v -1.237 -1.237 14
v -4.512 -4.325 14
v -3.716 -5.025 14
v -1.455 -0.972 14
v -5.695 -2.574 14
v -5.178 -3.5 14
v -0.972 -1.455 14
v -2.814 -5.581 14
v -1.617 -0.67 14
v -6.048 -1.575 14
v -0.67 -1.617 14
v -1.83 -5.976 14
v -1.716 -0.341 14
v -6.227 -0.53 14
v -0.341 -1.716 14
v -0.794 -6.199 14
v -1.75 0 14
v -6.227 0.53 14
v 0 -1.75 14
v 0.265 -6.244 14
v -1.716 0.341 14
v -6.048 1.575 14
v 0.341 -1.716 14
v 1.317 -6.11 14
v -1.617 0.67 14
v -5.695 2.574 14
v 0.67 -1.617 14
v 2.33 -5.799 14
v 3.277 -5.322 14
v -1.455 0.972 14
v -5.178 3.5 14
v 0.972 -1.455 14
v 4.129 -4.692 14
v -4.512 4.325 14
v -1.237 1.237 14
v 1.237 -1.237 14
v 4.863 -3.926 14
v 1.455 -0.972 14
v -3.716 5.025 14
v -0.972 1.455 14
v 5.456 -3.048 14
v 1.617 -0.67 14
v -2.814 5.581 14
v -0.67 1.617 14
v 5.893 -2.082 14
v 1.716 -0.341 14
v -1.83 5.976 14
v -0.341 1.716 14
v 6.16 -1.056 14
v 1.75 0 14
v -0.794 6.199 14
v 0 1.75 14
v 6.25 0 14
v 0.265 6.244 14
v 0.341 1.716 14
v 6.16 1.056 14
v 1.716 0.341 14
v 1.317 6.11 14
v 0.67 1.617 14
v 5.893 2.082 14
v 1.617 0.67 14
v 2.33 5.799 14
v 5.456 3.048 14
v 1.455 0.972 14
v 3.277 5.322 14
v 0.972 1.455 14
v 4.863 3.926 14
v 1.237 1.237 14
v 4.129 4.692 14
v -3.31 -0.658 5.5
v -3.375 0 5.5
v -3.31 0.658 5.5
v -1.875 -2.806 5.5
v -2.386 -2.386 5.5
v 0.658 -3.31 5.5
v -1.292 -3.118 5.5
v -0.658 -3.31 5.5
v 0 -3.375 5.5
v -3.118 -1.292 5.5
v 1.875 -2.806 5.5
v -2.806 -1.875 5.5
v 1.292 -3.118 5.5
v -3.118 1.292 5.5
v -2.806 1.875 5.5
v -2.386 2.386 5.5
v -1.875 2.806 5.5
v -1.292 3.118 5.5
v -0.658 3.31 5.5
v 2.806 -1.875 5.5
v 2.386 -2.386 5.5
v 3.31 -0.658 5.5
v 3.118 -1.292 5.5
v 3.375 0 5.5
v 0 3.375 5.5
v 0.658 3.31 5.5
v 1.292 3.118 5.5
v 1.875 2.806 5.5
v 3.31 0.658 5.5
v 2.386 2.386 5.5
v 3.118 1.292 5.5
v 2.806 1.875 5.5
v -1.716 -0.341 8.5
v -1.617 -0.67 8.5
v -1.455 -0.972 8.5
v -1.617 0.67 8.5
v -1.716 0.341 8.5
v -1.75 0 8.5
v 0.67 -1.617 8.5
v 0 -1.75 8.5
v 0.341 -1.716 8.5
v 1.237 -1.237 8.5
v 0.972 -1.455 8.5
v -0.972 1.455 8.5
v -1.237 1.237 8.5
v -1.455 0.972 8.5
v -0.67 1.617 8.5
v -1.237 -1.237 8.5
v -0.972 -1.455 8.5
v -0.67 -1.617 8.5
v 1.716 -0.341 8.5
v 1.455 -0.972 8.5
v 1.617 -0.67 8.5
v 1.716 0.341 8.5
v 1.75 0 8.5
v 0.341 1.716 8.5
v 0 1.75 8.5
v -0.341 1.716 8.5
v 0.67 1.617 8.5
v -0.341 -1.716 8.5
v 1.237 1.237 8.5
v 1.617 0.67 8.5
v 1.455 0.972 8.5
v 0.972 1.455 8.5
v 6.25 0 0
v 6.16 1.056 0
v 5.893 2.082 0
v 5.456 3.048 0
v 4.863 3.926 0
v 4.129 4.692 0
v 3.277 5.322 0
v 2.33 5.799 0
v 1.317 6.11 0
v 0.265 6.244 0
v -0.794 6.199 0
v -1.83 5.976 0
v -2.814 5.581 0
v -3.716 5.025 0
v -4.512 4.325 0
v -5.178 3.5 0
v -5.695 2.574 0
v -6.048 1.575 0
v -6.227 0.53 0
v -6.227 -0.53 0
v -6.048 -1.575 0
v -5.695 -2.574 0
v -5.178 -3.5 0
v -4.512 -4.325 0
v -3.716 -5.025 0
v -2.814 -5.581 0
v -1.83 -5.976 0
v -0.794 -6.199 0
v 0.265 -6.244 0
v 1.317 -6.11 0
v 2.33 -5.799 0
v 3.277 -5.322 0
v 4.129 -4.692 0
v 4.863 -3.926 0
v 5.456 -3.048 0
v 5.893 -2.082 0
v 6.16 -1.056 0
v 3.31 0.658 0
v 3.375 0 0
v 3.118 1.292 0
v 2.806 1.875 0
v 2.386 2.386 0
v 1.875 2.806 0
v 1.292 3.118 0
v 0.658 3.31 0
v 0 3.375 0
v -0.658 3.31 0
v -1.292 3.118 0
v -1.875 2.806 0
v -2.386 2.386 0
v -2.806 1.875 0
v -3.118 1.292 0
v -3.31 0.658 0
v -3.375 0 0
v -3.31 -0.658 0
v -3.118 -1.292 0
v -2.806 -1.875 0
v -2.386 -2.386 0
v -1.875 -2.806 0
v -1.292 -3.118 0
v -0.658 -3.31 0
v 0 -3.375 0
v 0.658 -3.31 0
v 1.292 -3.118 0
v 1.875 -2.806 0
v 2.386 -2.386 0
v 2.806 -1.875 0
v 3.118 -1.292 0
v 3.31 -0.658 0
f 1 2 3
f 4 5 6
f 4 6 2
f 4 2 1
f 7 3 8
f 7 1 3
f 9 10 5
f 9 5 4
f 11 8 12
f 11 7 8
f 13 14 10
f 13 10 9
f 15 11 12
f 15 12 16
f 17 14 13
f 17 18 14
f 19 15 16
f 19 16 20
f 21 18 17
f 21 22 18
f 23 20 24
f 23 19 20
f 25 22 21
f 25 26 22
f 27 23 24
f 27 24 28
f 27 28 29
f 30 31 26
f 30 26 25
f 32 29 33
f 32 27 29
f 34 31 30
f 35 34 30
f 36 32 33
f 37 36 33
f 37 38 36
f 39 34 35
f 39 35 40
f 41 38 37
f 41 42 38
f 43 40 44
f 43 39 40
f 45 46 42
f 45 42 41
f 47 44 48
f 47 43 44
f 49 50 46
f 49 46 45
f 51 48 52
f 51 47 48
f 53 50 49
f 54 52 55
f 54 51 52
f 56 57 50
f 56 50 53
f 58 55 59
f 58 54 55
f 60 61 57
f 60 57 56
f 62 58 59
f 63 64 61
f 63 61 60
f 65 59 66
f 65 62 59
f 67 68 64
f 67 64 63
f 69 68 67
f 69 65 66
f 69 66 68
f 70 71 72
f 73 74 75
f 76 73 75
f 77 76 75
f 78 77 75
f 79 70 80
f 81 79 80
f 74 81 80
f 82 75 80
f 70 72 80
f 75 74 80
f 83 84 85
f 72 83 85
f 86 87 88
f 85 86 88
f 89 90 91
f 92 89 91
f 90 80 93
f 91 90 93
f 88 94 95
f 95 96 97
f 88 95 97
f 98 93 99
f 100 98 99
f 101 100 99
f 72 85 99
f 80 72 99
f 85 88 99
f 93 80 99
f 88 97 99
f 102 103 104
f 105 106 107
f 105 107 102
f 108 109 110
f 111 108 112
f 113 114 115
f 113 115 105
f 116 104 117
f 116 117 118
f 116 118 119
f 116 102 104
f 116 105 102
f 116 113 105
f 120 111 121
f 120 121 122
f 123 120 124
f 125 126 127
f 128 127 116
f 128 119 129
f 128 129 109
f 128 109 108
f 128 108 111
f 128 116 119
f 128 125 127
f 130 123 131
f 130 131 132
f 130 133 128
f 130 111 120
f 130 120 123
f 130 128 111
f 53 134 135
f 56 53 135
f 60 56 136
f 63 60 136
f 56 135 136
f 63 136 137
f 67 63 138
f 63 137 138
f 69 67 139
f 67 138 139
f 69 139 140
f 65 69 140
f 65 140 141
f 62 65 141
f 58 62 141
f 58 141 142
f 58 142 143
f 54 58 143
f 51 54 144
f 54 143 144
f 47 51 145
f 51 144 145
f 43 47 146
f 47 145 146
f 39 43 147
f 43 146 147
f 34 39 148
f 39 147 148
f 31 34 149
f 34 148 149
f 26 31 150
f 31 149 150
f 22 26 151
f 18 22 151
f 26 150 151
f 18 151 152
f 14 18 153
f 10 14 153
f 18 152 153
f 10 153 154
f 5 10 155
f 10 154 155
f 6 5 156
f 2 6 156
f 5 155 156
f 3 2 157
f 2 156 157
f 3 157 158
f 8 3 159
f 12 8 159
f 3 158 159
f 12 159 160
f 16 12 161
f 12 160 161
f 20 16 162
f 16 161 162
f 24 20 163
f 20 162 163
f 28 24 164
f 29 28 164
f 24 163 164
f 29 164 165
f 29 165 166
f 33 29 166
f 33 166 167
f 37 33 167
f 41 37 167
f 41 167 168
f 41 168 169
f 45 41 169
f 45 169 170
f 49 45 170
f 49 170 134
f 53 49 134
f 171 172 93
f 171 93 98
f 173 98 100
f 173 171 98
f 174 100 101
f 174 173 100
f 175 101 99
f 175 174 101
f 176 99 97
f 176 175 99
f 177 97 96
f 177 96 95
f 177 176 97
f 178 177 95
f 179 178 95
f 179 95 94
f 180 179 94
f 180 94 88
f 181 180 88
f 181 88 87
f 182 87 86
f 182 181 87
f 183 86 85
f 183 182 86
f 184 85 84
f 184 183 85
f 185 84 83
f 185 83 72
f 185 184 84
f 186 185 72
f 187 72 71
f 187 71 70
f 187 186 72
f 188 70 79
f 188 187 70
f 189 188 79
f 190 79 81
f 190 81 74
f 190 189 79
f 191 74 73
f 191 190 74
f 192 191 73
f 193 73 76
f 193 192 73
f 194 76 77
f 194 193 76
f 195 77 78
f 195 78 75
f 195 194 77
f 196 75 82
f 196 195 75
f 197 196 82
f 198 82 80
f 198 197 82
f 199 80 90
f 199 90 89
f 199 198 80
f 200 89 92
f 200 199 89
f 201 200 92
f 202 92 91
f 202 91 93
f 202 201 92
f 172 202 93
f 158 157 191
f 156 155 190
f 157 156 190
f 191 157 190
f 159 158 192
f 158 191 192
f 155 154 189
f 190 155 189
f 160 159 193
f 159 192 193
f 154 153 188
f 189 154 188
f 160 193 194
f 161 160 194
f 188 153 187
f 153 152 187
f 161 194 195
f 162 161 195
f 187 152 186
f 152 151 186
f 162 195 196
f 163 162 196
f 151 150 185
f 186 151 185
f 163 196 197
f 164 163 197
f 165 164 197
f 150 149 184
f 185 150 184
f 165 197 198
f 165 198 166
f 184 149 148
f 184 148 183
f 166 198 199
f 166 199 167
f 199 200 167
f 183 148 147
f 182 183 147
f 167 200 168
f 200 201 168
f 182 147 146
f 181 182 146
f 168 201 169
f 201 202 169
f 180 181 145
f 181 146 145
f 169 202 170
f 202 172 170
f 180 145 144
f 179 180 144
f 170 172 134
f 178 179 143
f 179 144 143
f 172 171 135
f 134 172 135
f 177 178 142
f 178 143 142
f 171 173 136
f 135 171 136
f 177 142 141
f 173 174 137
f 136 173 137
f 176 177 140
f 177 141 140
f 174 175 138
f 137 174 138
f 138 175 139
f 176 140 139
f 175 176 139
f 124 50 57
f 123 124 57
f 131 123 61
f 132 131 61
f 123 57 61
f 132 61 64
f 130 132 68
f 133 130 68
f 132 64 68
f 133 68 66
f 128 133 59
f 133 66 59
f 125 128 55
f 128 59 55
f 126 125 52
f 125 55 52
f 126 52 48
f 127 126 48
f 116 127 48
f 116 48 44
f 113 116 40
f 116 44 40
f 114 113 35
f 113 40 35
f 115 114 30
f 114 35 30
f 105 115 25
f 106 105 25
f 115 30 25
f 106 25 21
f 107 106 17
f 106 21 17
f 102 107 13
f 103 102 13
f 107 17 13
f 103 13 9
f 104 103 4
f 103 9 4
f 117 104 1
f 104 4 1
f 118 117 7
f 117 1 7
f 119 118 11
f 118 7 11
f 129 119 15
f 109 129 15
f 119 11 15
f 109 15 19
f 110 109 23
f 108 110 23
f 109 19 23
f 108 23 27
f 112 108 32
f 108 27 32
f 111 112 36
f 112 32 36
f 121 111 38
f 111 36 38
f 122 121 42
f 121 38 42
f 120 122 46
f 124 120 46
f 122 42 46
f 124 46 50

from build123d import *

# Parameters (mm, degrees)
SKETCH2_R           = 6.25
BOSS_EXTRUDE1_DEPTH = 14
SKETCH4_R           = 1.75
CUT_EXTRUDE1_DEPTH  = 5.5
CUT_EXTRUDE2_START  = -14
SKETCH4_3_R         = 3.375
CUT_EXTRUDE2_DEPTH  = 5.5


with BuildPart() as part:
    # Sketch2 → Boss-Extrude1 (new body)
    with BuildSketch(Plane.XY):
        Circle(SKETCH2_R)
    extrude(amount=BOSS_EXTRUDE1_DEPTH)

    # Sketch4 → Cut-Extrude1 (cut)
    with BuildSketch(Plane.XY.offset(14)):
        Circle(SKETCH4_R)
    extrude(amount=-CUT_EXTRUDE1_DEPTH, mode=Mode.SUBTRACT)

    # Sketch4<3> → Cut-Extrude2 (cut)
    with BuildSketch(Plane.XY.offset(14).offset(CUT_EXTRUDE2_START)):
        Circle(SKETCH4_3_R)
    extrude(amount=CUT_EXTRUDE2_DEPTH, mode=Mode.SUBTRACT)


solid = part.part
